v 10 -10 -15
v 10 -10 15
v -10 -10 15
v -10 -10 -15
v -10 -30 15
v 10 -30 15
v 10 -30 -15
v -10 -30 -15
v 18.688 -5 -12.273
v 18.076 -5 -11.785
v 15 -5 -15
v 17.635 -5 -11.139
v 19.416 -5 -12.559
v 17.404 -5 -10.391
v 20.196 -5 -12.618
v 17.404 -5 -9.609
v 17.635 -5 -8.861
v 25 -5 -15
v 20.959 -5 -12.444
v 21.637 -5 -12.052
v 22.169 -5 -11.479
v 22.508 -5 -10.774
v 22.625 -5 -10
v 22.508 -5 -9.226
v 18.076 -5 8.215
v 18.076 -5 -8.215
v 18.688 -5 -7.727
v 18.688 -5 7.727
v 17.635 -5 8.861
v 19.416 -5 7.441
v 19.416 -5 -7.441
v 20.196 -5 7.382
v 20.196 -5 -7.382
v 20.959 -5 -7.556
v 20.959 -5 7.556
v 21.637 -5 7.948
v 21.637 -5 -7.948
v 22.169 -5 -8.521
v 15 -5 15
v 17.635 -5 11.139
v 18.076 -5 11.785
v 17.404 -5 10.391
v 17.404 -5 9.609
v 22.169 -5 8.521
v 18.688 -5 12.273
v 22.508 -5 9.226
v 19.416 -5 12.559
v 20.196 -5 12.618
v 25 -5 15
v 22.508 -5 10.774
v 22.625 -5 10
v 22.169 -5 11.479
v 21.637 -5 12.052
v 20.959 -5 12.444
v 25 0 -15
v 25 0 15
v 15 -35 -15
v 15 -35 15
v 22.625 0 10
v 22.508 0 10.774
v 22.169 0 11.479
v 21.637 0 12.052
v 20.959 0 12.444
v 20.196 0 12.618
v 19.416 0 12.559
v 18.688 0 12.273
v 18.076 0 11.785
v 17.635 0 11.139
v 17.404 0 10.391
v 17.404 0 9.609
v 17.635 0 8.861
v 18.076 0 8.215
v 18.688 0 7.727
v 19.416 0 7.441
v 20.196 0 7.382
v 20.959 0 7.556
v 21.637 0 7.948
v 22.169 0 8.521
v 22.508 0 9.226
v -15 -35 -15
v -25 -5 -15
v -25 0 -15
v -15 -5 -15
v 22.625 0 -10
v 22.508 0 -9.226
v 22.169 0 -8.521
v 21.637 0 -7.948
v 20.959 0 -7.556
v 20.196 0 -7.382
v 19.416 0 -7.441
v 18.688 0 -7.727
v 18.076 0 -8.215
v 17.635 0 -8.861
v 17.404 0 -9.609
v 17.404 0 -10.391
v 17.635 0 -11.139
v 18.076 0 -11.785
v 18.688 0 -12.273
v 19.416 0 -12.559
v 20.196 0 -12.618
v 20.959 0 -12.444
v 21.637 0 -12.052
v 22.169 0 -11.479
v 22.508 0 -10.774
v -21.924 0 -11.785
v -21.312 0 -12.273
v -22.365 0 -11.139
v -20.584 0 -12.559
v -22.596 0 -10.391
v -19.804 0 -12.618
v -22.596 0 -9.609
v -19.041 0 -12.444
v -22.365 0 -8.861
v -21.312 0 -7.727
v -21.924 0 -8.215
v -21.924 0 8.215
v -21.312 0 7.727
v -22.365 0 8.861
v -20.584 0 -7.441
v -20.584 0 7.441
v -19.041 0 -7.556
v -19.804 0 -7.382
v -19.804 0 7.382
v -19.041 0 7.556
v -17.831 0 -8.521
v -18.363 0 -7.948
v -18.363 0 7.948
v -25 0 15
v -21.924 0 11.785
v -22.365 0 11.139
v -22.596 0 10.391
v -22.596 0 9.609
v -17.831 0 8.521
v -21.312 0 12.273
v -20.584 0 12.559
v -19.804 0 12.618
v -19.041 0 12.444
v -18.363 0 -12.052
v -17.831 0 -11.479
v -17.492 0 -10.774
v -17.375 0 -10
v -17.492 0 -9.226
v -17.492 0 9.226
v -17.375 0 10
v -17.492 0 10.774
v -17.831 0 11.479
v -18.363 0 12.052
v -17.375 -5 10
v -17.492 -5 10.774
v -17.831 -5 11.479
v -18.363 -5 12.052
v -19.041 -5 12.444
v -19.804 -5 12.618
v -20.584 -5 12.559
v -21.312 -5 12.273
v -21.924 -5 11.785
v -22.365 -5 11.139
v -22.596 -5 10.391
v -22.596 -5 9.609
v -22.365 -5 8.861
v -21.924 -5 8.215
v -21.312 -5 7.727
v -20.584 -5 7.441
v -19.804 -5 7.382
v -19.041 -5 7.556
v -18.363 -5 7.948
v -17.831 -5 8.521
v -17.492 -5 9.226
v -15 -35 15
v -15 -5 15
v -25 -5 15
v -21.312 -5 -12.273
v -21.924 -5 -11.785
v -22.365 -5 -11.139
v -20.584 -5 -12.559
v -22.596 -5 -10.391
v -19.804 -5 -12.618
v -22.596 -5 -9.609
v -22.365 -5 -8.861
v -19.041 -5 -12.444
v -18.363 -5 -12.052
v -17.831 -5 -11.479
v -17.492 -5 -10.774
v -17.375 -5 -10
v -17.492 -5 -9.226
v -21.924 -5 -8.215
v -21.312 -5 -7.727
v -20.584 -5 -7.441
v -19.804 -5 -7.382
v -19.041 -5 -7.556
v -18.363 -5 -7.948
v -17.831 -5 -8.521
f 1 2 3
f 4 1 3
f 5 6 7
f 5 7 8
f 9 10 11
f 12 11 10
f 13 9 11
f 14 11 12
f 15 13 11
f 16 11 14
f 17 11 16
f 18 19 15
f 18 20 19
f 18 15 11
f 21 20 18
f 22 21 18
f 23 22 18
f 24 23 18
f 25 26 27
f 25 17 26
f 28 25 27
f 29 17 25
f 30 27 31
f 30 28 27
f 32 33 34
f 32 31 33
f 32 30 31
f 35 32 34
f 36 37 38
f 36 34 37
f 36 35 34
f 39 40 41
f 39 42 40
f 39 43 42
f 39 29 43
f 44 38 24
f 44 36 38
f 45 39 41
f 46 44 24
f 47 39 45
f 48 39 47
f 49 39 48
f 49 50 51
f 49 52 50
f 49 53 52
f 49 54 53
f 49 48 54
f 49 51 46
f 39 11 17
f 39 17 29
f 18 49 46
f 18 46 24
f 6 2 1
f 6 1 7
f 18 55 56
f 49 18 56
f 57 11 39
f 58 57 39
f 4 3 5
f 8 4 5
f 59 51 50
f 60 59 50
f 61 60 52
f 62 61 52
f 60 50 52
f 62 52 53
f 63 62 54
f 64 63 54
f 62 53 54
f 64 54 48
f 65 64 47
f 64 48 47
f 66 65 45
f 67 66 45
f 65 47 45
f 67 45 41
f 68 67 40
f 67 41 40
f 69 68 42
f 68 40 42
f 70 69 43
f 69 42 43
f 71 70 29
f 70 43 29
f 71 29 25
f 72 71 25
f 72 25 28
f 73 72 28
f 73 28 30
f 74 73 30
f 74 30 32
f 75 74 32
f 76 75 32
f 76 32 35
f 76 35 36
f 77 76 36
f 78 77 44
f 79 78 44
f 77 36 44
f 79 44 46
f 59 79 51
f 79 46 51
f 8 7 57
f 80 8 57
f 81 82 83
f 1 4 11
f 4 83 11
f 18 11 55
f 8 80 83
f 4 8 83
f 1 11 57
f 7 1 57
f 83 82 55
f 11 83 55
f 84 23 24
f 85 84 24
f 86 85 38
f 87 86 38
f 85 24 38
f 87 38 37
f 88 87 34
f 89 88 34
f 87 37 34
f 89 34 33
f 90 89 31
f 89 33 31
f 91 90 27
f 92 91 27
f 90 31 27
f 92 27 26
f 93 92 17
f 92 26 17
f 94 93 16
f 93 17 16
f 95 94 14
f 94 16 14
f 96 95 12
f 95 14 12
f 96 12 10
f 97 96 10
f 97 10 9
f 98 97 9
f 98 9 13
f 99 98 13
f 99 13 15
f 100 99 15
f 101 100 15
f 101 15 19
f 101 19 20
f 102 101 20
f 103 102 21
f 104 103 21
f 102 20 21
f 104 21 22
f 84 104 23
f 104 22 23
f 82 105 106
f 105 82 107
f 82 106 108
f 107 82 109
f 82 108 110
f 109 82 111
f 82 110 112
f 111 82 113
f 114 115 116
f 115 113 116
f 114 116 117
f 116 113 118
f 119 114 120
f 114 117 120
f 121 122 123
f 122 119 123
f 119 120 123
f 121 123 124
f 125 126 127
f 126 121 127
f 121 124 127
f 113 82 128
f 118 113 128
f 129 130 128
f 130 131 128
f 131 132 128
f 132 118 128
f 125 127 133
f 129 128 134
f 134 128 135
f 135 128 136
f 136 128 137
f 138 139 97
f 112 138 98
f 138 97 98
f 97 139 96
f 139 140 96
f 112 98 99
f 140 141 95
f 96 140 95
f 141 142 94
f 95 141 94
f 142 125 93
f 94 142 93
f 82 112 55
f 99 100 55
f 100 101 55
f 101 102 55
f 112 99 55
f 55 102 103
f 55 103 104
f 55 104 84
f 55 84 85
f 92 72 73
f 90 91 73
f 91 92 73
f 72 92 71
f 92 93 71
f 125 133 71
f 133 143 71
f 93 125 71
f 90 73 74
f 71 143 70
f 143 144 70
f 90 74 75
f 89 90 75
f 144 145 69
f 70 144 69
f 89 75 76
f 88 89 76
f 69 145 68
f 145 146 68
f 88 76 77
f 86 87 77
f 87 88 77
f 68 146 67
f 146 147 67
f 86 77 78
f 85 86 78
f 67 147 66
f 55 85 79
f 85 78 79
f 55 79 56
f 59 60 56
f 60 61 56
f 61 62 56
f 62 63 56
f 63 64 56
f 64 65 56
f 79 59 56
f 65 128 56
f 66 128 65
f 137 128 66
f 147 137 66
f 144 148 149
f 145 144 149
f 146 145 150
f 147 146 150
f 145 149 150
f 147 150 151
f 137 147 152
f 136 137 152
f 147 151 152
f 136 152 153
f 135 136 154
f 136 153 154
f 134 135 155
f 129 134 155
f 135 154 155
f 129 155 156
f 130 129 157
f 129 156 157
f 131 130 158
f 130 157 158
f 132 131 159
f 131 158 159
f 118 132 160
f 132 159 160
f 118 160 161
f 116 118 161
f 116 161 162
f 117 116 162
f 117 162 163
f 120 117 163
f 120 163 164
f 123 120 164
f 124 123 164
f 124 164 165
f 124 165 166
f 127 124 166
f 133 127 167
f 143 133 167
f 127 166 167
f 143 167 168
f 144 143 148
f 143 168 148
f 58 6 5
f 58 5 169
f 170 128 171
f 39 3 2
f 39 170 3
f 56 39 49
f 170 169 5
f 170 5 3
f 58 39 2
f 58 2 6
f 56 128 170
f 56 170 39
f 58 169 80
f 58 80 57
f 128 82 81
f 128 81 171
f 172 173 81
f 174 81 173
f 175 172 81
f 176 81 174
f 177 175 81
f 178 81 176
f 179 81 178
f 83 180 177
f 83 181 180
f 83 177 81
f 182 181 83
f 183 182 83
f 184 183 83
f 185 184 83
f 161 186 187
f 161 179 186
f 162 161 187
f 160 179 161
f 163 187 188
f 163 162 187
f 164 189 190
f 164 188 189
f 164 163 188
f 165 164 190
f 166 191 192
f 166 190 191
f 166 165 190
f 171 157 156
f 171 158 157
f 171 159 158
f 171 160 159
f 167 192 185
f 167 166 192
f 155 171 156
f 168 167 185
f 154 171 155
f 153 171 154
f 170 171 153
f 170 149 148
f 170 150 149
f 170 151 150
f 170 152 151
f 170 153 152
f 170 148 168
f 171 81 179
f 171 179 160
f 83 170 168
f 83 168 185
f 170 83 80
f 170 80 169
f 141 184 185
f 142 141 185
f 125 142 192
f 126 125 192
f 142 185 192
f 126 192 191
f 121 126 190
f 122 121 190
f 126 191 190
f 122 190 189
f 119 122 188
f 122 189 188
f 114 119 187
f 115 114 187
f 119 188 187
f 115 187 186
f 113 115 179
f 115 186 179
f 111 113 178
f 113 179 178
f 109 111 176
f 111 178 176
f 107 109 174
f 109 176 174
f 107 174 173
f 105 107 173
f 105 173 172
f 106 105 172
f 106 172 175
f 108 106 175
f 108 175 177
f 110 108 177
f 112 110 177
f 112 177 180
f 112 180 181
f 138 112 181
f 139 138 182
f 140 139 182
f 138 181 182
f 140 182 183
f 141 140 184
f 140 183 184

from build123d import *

# Parameters (mm, degrees)
SKETCH_W        = 50
SKETCH_H        = 30
PAD_DEPTH       = 5
SKETCH001_R     = 2.625
POCKET_DEPTH    = 5
SKETCH002_W     = 30
SKETCH002_H     = 30
PAD001_DEPTH    = 30
SKETCH003_W     = 20
SKETCH003_H     = 20
POCKET001_DEPTH = 30


with BuildPart() as part:
    # Sketch → Pad (new body)
    with BuildSketch(Plane.XZ):
        Rectangle(SKETCH_W, SKETCH_H)
    extrude(amount=PAD_DEPTH)

    # Sketch001 (on Face6 of Pad) → Pocket (cut)
    with BuildSketch(Plane.XZ.offset(5)):
        with Locations((-20, 10)):
            Circle(SKETCH001_R)
        with Locations((20, 10)):
            Circle(SKETCH001_R)
        with Locations((20, -10)):
            Circle(SKETCH001_R)
        with Locations((-20, -10)):
            Circle(SKETCH001_R)
    extrude(amount=-POCKET_DEPTH, mode=Mode.SUBTRACT)

    # Sketch002 (on Face5 of Pocket) → Pad001 (join)
    with BuildSketch(Plane.XZ.offset(5)):
        Rectangle(SKETCH002_W, SKETCH002_H)
    extrude(amount=PAD001_DEPTH)

    # Sketch003 (on Face9 of Pad001) → Pocket001 (cut)
    with BuildSketch(Plane(origin=(0, 0, 15), x_dir=(-1, 0, 0), z_dir=(0, 0, 1))):
        with Locations((0, 20)):
            Rectangle(SKETCH003_W, SKETCH003_H)
    extrude(amount=-POCKET001_DEPTH, mode=Mode.SUBTRACT)


solid = part.part
